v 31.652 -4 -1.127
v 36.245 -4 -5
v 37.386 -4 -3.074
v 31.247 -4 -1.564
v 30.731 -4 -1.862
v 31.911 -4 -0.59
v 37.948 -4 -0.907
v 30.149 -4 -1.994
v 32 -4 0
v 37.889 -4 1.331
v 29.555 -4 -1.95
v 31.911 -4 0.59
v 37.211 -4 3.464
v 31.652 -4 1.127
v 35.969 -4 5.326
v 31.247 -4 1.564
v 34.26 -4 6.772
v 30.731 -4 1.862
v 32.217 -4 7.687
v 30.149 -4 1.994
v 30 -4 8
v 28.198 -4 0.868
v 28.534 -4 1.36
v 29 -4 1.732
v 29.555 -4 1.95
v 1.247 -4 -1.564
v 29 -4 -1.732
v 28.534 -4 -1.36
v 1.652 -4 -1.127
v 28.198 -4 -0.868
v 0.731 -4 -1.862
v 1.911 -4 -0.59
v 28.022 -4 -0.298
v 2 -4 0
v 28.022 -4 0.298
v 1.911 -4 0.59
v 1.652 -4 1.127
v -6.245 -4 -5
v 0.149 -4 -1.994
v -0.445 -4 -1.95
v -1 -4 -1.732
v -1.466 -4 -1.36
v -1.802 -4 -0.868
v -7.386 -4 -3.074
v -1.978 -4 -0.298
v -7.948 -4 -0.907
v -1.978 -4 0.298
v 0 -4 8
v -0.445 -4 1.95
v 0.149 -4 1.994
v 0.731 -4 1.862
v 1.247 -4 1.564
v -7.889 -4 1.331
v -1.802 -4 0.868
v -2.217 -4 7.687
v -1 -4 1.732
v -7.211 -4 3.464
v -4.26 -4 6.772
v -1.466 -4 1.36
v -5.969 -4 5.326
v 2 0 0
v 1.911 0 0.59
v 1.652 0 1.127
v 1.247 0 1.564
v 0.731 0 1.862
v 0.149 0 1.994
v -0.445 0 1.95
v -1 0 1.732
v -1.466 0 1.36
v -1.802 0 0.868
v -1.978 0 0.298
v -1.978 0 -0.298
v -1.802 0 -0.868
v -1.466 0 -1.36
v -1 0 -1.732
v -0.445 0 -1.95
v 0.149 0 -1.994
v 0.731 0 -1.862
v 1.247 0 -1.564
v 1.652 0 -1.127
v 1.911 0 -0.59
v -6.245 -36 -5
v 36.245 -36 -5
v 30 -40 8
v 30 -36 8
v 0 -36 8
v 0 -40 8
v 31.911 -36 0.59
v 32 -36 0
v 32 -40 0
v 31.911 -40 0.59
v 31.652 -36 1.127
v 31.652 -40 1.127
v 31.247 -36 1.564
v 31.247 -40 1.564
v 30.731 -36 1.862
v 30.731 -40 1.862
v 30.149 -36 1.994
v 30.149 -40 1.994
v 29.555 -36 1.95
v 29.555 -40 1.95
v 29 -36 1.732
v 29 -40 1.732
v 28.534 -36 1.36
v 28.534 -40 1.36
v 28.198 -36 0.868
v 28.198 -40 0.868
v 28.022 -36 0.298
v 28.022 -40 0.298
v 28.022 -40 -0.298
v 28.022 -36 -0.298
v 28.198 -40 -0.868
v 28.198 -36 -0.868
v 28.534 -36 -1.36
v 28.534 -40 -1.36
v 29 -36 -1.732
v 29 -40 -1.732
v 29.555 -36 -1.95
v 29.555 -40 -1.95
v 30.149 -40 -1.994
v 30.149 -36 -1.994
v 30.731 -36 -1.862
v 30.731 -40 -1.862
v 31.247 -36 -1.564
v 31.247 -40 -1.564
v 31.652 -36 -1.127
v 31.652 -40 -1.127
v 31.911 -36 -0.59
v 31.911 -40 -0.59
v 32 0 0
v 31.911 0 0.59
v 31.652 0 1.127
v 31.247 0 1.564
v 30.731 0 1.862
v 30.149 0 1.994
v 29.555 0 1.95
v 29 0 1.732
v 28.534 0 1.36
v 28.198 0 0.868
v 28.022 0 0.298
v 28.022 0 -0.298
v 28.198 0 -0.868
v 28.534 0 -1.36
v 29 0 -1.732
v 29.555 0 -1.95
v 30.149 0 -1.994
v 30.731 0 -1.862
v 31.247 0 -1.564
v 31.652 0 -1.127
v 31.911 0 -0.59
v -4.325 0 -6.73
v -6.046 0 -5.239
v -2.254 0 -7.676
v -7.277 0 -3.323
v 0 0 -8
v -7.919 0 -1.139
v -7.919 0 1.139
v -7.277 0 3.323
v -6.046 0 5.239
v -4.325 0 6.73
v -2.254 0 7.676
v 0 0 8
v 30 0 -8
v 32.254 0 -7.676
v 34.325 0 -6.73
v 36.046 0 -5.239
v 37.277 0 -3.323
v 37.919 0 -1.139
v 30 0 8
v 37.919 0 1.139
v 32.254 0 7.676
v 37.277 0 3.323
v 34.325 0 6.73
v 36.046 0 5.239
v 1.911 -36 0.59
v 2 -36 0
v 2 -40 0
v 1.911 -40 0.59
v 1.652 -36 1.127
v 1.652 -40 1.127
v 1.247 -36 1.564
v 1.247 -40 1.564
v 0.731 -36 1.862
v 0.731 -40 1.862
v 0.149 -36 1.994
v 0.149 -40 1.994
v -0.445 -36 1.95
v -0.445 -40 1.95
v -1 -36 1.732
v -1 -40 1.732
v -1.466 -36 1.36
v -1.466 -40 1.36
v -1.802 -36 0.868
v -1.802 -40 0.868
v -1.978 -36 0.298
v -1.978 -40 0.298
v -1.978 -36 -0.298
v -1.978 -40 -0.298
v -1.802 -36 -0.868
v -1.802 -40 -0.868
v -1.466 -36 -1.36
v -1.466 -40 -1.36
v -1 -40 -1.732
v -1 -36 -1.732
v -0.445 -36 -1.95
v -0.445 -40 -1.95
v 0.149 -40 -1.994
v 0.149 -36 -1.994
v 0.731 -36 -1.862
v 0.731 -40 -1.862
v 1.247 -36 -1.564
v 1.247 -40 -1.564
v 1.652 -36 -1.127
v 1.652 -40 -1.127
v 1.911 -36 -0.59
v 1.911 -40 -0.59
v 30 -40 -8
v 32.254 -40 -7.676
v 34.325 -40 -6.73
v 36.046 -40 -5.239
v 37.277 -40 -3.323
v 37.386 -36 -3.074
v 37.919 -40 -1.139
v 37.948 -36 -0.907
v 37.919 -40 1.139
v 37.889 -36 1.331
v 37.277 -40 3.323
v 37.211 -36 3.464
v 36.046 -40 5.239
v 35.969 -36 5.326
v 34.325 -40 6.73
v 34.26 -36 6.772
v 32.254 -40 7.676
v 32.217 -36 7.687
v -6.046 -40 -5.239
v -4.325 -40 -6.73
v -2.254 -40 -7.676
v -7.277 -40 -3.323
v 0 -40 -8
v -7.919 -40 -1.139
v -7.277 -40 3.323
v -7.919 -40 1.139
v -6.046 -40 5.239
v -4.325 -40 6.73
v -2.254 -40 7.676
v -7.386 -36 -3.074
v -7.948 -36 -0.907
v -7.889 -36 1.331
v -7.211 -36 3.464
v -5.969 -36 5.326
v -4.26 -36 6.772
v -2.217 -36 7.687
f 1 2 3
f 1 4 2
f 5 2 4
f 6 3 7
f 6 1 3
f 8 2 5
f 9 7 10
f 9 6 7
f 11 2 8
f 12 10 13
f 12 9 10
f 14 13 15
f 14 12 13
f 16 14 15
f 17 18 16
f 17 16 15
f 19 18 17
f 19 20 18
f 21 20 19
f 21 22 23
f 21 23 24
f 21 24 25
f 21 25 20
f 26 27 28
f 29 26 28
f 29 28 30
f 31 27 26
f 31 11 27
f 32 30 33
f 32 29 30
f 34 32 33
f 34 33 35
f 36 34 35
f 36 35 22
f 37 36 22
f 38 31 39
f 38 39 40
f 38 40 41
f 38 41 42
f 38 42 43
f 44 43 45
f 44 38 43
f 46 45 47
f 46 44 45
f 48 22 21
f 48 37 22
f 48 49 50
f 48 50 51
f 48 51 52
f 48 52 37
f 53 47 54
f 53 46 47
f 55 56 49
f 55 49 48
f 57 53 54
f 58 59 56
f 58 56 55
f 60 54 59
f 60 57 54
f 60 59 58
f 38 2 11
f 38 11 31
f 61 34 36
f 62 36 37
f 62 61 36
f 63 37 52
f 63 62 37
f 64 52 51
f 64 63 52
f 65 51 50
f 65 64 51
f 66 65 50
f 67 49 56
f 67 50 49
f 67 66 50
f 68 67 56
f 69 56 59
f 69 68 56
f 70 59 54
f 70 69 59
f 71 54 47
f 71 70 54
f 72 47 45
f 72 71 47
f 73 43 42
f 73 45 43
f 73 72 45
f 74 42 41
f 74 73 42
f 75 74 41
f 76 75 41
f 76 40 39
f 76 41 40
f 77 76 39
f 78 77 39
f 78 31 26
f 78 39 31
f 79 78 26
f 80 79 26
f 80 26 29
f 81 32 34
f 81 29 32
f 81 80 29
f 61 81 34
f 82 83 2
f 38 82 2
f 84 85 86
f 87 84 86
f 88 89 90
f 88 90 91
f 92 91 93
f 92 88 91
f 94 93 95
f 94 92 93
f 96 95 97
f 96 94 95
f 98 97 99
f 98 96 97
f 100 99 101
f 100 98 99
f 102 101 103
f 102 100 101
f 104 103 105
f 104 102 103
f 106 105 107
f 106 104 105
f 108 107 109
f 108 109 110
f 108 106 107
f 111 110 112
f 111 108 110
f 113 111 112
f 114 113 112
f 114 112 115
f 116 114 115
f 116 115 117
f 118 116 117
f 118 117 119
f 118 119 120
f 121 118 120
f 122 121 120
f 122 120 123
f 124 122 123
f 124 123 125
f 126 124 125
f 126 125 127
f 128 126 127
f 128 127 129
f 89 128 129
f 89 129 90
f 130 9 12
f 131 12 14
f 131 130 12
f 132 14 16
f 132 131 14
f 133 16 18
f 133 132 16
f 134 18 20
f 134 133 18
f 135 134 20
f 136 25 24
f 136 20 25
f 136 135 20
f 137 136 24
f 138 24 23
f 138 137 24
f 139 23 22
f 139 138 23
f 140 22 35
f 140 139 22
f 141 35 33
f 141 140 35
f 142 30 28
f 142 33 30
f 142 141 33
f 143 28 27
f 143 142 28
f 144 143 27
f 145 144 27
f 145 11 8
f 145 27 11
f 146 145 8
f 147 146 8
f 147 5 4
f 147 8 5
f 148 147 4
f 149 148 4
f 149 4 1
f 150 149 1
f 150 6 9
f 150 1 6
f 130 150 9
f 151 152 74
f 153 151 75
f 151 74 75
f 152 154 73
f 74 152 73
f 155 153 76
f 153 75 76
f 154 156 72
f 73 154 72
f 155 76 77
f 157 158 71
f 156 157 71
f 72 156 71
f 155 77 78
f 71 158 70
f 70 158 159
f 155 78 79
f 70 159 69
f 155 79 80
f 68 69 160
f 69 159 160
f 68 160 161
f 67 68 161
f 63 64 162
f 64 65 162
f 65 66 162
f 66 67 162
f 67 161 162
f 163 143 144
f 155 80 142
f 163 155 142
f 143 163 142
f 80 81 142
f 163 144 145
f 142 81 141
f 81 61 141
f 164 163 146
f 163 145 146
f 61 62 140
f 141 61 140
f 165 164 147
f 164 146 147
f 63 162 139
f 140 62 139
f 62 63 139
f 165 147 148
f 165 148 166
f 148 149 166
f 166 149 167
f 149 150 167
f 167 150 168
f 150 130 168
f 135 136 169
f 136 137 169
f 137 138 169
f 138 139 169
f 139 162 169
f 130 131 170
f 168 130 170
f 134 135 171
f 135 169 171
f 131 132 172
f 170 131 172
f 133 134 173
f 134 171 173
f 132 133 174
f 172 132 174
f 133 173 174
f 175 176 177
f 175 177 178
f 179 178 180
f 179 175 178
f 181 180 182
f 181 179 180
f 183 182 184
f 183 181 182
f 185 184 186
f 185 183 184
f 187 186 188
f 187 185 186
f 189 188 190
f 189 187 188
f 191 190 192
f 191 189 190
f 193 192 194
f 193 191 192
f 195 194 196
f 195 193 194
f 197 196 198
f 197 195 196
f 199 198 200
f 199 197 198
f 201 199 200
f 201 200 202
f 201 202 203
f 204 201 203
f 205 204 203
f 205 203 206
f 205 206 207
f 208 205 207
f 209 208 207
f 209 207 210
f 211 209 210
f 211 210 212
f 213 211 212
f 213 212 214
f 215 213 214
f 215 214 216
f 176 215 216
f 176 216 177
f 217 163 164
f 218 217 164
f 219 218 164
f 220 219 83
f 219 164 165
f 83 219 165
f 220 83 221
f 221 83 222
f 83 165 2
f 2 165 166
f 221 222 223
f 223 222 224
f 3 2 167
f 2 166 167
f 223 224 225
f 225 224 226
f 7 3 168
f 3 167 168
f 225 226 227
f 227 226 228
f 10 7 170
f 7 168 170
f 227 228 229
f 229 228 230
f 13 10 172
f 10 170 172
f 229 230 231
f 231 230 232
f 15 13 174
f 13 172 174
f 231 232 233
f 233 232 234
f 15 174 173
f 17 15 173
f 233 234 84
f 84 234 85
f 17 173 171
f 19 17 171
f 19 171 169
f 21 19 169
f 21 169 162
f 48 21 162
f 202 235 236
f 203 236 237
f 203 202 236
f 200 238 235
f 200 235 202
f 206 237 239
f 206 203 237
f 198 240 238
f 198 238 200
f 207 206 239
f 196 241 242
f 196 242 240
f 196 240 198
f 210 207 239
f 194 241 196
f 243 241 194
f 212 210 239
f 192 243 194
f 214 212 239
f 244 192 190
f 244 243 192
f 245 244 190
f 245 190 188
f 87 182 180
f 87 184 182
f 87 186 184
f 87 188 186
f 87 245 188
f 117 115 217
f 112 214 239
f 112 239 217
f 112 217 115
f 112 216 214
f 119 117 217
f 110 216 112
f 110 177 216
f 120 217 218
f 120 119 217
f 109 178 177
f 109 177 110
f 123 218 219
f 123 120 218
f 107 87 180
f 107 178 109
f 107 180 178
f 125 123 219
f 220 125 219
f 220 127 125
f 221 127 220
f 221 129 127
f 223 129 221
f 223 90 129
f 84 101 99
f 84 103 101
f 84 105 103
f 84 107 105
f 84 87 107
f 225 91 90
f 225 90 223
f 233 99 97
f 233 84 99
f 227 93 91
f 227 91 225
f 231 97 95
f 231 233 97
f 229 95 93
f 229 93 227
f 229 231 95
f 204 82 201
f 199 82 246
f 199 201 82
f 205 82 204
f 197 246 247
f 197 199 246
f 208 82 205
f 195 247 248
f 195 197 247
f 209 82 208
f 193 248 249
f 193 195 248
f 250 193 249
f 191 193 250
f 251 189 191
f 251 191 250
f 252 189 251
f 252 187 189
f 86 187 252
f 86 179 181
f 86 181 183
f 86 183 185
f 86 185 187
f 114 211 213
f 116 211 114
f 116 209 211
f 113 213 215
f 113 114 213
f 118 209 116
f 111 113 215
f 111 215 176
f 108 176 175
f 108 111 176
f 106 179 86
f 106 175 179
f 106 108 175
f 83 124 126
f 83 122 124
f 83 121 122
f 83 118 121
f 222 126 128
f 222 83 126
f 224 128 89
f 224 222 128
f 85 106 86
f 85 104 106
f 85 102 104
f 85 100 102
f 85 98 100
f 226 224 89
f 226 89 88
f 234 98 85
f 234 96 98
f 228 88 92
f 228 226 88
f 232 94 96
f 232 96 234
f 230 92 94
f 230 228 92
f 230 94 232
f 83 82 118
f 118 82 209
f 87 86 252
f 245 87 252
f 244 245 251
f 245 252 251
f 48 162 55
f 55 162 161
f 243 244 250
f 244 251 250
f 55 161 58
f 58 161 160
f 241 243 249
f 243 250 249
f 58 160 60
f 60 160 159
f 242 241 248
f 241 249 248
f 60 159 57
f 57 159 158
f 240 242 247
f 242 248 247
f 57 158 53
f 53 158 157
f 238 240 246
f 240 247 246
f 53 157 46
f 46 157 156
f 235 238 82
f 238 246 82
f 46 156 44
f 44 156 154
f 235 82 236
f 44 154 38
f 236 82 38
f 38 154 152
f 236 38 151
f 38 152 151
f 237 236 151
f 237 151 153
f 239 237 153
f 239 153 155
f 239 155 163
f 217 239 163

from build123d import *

# Parameters (mm, degrees)
F0_R          = 2
F1_DEPTH      = 40
F2_W          = 32
F2_H          = 13
F3_DEPTH      = 38.001
F3_DEPTH_BACK = 25


with BuildPart() as f1:
    # F0 (on Front) → F1 (new body)
    with BuildSketch(Plane.XZ):
        with BuildLine():
            Line((30, 8), (0, 8))
            ThreePointArc((0, 8), (-8, 0), (0, -8))
            Line((0, -8), (30, -8))
            ThreePointArc((30, -8), (38, 0), (30, 8))
        make_face()
        Circle(F0_R, mode=Mode.SUBTRACT)
        with Locations((30, 0)):
            Circle(F0_R, mode=Mode.SUBTRACT)
    extrude(amount=F1_DEPTH)

    # F2 (on Right) → F3 (cut, two sides)
    with BuildSketch(Plane.YZ) as f3_sk:
        with Locations((-20, 1.5)):
            Rectangle(F2_W, F2_H)
    extrude(amount=F3_DEPTH, mode=Mode.SUBTRACT)
    extrude(f3_sk.sketch, amount=-F3_DEPTH_BACK, mode=Mode.SUBTRACT)


solid = f1.part
